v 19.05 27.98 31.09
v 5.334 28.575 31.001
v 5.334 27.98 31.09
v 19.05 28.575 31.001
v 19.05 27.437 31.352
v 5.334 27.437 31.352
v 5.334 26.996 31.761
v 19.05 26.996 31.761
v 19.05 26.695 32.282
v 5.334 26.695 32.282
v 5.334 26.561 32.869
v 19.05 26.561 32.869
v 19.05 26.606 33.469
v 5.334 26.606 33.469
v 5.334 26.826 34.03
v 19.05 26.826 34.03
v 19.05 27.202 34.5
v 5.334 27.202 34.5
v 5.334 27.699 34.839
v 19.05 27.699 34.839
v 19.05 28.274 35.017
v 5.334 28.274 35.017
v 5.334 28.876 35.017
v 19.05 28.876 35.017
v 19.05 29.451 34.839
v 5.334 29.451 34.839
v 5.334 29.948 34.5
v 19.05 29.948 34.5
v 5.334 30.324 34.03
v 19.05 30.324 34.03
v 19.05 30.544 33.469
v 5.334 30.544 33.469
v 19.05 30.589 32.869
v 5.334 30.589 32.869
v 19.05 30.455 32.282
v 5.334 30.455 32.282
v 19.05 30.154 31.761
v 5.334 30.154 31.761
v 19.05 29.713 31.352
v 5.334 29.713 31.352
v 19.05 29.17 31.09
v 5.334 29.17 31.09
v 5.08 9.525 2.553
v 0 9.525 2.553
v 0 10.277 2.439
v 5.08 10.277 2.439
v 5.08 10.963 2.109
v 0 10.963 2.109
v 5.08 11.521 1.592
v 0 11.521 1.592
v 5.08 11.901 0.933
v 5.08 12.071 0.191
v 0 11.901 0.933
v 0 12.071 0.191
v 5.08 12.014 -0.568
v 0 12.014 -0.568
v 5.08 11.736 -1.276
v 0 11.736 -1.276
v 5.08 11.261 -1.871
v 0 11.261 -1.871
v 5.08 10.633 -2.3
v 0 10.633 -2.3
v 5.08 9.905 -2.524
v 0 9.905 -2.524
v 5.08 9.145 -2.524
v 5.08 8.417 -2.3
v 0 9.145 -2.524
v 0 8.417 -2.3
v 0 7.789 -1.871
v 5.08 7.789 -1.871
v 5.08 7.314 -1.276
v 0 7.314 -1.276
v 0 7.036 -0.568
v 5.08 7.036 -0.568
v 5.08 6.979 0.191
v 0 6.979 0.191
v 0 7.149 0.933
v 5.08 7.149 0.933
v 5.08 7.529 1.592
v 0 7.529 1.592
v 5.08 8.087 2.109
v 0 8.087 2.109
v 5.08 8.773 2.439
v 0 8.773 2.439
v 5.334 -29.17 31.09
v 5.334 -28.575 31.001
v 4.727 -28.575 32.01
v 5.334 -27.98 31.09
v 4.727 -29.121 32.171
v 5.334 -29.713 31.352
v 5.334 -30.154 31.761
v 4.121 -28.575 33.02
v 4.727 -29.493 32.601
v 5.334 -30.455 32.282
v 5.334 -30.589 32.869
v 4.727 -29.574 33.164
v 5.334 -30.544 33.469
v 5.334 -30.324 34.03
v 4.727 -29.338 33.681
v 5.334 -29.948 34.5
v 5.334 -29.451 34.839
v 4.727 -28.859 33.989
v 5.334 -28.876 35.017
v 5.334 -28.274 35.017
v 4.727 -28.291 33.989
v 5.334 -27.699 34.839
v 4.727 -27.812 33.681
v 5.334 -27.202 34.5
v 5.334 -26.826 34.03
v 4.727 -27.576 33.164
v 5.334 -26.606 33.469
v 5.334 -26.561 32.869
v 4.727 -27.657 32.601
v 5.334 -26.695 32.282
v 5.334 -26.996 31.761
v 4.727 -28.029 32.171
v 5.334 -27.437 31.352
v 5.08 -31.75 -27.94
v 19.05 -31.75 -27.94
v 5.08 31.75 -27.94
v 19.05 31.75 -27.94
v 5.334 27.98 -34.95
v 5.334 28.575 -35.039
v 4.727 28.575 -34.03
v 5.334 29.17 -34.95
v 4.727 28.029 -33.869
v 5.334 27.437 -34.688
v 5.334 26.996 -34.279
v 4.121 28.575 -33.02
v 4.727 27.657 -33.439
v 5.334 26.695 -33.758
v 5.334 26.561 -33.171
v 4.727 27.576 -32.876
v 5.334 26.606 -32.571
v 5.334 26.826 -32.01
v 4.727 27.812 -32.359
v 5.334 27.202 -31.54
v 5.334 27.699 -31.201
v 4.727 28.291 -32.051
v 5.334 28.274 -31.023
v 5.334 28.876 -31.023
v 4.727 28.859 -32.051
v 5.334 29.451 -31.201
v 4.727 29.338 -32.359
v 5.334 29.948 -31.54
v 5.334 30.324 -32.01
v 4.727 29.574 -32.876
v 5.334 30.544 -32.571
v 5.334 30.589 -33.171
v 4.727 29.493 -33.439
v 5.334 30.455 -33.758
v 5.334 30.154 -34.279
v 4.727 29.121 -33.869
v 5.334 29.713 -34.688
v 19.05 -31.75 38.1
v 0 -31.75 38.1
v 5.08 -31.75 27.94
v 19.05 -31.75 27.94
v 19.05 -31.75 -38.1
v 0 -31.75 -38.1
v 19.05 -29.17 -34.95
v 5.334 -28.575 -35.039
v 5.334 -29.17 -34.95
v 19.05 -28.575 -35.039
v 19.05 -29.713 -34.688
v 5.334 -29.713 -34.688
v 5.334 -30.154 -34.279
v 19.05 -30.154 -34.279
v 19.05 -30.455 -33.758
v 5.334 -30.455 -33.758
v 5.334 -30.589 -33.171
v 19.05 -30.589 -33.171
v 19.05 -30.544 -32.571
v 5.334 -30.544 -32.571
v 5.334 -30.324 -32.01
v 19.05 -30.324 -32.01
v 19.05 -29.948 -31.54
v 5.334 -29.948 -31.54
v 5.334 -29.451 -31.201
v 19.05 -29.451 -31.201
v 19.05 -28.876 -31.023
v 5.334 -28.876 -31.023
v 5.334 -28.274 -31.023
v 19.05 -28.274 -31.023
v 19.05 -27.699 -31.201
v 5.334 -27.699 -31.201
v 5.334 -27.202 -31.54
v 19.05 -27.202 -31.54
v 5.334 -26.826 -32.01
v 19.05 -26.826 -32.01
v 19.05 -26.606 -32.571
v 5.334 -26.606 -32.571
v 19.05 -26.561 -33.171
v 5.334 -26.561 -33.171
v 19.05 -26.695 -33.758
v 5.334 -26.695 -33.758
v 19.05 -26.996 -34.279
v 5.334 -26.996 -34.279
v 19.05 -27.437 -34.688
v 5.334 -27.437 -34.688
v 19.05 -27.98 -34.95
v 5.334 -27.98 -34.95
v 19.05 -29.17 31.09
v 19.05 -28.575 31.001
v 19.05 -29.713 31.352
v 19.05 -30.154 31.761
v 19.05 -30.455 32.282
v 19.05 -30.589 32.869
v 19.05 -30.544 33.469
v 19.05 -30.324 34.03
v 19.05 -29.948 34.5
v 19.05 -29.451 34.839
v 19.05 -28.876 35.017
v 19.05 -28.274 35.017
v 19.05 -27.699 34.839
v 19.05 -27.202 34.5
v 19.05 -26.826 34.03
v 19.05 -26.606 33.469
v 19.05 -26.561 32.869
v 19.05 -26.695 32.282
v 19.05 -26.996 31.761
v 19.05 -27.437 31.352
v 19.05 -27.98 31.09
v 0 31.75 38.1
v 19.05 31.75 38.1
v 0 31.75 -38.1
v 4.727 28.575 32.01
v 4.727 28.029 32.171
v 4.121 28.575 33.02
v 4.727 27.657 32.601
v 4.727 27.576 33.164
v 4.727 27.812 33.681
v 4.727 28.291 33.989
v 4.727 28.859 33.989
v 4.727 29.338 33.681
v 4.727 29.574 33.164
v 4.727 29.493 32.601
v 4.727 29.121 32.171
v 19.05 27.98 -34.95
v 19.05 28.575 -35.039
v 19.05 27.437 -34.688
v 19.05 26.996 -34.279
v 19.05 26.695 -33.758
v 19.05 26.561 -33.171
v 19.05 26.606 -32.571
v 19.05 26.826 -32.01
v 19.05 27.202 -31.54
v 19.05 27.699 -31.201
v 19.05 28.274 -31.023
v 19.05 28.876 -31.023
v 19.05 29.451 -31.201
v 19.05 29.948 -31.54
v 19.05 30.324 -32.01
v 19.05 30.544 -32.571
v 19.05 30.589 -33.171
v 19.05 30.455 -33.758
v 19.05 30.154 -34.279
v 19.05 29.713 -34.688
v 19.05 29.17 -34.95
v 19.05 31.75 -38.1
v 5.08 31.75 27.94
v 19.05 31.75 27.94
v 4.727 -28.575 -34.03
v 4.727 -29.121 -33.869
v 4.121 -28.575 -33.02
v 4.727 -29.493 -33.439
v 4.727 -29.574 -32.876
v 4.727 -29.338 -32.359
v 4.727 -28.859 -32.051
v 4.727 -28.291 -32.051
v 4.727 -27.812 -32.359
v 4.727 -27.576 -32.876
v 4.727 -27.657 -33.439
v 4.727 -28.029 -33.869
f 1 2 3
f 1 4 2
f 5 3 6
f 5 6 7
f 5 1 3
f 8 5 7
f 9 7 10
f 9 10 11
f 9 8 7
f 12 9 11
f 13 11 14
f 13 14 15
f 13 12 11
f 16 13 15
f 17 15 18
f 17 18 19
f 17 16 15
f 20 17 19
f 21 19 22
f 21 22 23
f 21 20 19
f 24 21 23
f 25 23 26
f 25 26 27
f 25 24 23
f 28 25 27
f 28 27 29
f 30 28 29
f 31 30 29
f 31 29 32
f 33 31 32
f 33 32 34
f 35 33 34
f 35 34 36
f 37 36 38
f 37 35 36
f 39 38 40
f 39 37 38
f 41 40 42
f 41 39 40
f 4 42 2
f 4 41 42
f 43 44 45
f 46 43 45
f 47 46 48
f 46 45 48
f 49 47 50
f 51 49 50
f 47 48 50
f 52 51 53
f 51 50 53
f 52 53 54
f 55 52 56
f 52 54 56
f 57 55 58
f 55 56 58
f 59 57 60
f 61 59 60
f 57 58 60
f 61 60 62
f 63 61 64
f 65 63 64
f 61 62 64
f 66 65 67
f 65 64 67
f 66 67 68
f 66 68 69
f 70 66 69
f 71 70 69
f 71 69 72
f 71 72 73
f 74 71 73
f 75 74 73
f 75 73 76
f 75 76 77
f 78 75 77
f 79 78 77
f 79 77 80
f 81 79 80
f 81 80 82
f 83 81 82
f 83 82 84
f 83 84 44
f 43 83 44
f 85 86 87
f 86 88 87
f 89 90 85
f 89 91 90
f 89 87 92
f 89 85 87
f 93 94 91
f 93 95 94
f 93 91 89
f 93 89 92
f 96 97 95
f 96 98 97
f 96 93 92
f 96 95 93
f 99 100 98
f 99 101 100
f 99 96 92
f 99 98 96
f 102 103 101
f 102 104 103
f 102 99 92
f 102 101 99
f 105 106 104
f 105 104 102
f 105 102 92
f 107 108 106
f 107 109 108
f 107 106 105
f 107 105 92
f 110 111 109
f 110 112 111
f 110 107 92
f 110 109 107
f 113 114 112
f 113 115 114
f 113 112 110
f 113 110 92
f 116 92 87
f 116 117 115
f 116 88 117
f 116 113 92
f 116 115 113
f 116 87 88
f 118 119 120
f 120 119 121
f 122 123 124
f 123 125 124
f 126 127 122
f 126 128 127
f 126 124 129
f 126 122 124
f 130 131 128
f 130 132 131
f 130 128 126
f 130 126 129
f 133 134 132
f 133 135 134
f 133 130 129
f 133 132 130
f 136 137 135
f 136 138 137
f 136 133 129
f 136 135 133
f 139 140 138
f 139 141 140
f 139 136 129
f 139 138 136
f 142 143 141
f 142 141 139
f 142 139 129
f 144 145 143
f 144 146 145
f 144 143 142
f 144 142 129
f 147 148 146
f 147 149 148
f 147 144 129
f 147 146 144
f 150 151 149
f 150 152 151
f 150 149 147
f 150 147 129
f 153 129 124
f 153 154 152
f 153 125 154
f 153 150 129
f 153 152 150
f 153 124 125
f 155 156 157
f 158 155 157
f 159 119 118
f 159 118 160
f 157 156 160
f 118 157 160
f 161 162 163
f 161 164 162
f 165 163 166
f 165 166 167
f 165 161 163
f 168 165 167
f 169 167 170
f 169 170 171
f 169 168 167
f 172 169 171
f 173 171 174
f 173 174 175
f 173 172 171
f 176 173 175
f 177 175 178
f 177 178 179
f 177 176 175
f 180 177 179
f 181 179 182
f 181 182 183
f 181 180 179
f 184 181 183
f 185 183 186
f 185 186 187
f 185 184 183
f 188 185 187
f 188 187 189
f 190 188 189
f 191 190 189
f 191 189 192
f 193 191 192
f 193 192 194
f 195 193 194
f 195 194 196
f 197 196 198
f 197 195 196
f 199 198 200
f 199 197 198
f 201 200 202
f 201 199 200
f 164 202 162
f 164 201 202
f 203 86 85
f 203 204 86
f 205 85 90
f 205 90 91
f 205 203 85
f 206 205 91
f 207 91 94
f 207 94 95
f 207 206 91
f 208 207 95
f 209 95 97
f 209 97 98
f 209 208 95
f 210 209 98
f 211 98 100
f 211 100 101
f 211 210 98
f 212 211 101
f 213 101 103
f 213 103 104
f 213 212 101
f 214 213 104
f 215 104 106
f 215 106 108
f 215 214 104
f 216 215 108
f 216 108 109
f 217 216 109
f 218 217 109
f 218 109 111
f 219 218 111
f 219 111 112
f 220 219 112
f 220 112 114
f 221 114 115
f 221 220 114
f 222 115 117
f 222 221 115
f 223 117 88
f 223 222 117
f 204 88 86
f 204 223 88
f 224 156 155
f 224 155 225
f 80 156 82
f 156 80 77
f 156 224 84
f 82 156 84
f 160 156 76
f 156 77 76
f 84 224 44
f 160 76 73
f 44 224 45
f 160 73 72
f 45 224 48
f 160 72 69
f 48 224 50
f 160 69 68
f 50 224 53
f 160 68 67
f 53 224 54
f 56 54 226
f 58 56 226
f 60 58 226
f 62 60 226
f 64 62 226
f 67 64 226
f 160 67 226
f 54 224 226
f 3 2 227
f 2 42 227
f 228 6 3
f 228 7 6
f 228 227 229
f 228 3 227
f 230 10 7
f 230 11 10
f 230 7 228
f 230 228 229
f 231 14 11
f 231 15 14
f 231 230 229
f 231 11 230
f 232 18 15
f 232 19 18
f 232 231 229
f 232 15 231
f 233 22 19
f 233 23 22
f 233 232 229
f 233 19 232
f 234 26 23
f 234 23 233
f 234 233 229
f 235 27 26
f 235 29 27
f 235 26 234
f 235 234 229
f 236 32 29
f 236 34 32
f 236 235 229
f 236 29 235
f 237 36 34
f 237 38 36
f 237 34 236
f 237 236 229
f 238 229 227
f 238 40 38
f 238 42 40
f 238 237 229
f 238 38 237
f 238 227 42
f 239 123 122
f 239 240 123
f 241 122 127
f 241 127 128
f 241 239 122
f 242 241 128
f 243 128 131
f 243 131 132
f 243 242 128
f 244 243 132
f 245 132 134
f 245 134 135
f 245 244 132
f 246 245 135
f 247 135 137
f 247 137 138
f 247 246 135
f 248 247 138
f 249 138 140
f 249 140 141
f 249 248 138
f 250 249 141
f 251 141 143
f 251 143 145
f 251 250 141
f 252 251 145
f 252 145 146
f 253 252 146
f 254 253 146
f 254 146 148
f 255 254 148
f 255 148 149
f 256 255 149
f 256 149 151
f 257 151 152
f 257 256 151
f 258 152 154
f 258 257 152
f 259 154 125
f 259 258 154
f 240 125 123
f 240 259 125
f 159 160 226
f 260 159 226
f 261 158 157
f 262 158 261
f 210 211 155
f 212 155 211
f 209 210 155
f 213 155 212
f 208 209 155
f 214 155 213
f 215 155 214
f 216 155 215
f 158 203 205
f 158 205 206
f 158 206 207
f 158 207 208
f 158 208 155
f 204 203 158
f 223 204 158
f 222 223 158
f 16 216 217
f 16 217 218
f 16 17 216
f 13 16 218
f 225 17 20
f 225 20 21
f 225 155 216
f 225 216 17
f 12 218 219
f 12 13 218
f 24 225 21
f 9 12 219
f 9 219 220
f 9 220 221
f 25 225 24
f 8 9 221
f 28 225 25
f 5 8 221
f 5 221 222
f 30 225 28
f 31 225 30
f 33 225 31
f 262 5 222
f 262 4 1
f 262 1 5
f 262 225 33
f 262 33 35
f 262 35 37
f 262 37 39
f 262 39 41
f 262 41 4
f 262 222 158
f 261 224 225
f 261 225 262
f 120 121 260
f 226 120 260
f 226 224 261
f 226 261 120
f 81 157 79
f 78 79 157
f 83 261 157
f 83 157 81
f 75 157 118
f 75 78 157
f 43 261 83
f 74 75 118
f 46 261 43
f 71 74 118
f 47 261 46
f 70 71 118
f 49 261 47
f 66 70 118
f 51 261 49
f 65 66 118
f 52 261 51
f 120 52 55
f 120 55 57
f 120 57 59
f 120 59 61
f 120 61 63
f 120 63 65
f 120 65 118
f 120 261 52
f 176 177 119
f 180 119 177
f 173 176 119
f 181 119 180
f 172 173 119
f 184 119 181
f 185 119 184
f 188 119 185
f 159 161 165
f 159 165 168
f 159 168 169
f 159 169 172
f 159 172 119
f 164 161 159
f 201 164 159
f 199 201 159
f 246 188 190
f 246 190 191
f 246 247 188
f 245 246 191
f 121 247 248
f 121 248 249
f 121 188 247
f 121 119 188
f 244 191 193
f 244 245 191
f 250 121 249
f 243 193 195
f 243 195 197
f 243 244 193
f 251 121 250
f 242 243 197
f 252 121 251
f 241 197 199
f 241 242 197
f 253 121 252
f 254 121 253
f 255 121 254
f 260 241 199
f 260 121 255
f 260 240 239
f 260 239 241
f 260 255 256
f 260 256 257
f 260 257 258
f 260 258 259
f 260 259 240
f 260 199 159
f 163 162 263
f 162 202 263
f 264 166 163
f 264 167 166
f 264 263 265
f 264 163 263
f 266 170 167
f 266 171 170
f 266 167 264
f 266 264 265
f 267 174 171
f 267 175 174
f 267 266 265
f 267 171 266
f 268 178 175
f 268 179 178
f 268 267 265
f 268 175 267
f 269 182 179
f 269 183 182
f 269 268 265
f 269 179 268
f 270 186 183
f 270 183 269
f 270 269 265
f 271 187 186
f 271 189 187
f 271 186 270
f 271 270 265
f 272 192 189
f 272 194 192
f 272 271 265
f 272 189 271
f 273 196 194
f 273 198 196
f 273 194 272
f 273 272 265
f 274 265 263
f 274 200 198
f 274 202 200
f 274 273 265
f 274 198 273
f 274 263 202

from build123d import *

# Parameters (mm, degrees)
SKETCH1_W                   = 76.2
SKETCH1_H                   = 63.5
BOSS_EXTRUDE1_DEPTH         = 19.05
SKETCH2_W                   = 55.88
SKETCH2_H                   = 63.5
CUT_EXTRUDE1_DEPTH          = 13.97
F_1_4_20_TAPPED_HOLE1_D     = 5.1054
F_1_4_20_TAPPED_HOLE1_DEPTH = 19.05
F_1_4_20_TAPPED_HOLE1_TIP   = 1.533816902
LPATTERN1_COUNT             = 2
LPATTERN1_PITCH             = 57.15
LPATTERN1_COUNT_DIR2        = 2
LPATTERN1_PITCH_DIR2        = 66.04


with BuildPart() as part:
    # Sketch1 → Boss-Extrude1 (new body)
    with BuildSketch(Plane(origin=(0, 0, 0), x_dir=(0, 0, -1), z_dir=(1, 0, 0))):
        Rectangle(SKETCH1_W, SKETCH1_H)
    extrude(amount=BOSS_EXTRUDE1_DEPTH)

    # Sketch2 → Cut-Extrude1 (cut)
    with BuildSketch(Plane(origin=(19.05, 0, 0), x_dir=(0, 0, -1), z_dir=(1, 0, 0))):
        Rectangle(SKETCH2_W, SKETCH2_H)
    extrude(amount=-CUT_EXTRUDE1_DEPTH, mode=Mode.SUBTRACT)

    # Sketch5 → #10-32 Tapped Hole1 (revolve, cut)
    with BuildSketch(Plane(origin=(19.05, 28.575, 33.02), x_dir=(0, 0, -1), z_dir=(0, 1, 0))):
        Polygon((0, 0), (0, 14.929317848), (2.0193, 13.716), (2.0193, 0), align=None)
    f_10_32_tapped_hole1 = revolve(axis=Axis((25.4, 28.575, 33.02), (-1, 0, 0)), mode=Mode.SUBTRACT)

    # 1/4-20 Tapped Hole1
    with Locations(Plane(origin=(5.08, 0, 0), x_dir=(0, 0, -1), z_dir=(1, 0, 0))):
        with Locations((0, 9.525)):
            Hole(F_1_4_20_TAPPED_HOLE1_D / 2, depth=F_1_4_20_TAPPED_HOLE1_DEPTH)
            with Locations((0, 0, -(F_1_4_20_TAPPED_HOLE1_DEPTH + F_1_4_20_TAPPED_HOLE1_TIP / 2))):  # 118° drill point
                Cone(0, F_1_4_20_TAPPED_HOLE1_D / 2, F_1_4_20_TAPPED_HOLE1_TIP, mode=Mode.SUBTRACT)

    # LPattern1: 10-32 Tapped Hole1 2 × 2
    with Locations(*[(0, -i * LPATTERN1_PITCH, -j * LPATTERN1_PITCH_DIR2) for i in range(LPATTERN1_COUNT) for j in range(LPATTERN1_COUNT_DIR2) if (i, j) != (0, 0)]):
        add(f_10_32_tapped_hole1, mode=Mode.SUBTRACT)


solid = part.part
